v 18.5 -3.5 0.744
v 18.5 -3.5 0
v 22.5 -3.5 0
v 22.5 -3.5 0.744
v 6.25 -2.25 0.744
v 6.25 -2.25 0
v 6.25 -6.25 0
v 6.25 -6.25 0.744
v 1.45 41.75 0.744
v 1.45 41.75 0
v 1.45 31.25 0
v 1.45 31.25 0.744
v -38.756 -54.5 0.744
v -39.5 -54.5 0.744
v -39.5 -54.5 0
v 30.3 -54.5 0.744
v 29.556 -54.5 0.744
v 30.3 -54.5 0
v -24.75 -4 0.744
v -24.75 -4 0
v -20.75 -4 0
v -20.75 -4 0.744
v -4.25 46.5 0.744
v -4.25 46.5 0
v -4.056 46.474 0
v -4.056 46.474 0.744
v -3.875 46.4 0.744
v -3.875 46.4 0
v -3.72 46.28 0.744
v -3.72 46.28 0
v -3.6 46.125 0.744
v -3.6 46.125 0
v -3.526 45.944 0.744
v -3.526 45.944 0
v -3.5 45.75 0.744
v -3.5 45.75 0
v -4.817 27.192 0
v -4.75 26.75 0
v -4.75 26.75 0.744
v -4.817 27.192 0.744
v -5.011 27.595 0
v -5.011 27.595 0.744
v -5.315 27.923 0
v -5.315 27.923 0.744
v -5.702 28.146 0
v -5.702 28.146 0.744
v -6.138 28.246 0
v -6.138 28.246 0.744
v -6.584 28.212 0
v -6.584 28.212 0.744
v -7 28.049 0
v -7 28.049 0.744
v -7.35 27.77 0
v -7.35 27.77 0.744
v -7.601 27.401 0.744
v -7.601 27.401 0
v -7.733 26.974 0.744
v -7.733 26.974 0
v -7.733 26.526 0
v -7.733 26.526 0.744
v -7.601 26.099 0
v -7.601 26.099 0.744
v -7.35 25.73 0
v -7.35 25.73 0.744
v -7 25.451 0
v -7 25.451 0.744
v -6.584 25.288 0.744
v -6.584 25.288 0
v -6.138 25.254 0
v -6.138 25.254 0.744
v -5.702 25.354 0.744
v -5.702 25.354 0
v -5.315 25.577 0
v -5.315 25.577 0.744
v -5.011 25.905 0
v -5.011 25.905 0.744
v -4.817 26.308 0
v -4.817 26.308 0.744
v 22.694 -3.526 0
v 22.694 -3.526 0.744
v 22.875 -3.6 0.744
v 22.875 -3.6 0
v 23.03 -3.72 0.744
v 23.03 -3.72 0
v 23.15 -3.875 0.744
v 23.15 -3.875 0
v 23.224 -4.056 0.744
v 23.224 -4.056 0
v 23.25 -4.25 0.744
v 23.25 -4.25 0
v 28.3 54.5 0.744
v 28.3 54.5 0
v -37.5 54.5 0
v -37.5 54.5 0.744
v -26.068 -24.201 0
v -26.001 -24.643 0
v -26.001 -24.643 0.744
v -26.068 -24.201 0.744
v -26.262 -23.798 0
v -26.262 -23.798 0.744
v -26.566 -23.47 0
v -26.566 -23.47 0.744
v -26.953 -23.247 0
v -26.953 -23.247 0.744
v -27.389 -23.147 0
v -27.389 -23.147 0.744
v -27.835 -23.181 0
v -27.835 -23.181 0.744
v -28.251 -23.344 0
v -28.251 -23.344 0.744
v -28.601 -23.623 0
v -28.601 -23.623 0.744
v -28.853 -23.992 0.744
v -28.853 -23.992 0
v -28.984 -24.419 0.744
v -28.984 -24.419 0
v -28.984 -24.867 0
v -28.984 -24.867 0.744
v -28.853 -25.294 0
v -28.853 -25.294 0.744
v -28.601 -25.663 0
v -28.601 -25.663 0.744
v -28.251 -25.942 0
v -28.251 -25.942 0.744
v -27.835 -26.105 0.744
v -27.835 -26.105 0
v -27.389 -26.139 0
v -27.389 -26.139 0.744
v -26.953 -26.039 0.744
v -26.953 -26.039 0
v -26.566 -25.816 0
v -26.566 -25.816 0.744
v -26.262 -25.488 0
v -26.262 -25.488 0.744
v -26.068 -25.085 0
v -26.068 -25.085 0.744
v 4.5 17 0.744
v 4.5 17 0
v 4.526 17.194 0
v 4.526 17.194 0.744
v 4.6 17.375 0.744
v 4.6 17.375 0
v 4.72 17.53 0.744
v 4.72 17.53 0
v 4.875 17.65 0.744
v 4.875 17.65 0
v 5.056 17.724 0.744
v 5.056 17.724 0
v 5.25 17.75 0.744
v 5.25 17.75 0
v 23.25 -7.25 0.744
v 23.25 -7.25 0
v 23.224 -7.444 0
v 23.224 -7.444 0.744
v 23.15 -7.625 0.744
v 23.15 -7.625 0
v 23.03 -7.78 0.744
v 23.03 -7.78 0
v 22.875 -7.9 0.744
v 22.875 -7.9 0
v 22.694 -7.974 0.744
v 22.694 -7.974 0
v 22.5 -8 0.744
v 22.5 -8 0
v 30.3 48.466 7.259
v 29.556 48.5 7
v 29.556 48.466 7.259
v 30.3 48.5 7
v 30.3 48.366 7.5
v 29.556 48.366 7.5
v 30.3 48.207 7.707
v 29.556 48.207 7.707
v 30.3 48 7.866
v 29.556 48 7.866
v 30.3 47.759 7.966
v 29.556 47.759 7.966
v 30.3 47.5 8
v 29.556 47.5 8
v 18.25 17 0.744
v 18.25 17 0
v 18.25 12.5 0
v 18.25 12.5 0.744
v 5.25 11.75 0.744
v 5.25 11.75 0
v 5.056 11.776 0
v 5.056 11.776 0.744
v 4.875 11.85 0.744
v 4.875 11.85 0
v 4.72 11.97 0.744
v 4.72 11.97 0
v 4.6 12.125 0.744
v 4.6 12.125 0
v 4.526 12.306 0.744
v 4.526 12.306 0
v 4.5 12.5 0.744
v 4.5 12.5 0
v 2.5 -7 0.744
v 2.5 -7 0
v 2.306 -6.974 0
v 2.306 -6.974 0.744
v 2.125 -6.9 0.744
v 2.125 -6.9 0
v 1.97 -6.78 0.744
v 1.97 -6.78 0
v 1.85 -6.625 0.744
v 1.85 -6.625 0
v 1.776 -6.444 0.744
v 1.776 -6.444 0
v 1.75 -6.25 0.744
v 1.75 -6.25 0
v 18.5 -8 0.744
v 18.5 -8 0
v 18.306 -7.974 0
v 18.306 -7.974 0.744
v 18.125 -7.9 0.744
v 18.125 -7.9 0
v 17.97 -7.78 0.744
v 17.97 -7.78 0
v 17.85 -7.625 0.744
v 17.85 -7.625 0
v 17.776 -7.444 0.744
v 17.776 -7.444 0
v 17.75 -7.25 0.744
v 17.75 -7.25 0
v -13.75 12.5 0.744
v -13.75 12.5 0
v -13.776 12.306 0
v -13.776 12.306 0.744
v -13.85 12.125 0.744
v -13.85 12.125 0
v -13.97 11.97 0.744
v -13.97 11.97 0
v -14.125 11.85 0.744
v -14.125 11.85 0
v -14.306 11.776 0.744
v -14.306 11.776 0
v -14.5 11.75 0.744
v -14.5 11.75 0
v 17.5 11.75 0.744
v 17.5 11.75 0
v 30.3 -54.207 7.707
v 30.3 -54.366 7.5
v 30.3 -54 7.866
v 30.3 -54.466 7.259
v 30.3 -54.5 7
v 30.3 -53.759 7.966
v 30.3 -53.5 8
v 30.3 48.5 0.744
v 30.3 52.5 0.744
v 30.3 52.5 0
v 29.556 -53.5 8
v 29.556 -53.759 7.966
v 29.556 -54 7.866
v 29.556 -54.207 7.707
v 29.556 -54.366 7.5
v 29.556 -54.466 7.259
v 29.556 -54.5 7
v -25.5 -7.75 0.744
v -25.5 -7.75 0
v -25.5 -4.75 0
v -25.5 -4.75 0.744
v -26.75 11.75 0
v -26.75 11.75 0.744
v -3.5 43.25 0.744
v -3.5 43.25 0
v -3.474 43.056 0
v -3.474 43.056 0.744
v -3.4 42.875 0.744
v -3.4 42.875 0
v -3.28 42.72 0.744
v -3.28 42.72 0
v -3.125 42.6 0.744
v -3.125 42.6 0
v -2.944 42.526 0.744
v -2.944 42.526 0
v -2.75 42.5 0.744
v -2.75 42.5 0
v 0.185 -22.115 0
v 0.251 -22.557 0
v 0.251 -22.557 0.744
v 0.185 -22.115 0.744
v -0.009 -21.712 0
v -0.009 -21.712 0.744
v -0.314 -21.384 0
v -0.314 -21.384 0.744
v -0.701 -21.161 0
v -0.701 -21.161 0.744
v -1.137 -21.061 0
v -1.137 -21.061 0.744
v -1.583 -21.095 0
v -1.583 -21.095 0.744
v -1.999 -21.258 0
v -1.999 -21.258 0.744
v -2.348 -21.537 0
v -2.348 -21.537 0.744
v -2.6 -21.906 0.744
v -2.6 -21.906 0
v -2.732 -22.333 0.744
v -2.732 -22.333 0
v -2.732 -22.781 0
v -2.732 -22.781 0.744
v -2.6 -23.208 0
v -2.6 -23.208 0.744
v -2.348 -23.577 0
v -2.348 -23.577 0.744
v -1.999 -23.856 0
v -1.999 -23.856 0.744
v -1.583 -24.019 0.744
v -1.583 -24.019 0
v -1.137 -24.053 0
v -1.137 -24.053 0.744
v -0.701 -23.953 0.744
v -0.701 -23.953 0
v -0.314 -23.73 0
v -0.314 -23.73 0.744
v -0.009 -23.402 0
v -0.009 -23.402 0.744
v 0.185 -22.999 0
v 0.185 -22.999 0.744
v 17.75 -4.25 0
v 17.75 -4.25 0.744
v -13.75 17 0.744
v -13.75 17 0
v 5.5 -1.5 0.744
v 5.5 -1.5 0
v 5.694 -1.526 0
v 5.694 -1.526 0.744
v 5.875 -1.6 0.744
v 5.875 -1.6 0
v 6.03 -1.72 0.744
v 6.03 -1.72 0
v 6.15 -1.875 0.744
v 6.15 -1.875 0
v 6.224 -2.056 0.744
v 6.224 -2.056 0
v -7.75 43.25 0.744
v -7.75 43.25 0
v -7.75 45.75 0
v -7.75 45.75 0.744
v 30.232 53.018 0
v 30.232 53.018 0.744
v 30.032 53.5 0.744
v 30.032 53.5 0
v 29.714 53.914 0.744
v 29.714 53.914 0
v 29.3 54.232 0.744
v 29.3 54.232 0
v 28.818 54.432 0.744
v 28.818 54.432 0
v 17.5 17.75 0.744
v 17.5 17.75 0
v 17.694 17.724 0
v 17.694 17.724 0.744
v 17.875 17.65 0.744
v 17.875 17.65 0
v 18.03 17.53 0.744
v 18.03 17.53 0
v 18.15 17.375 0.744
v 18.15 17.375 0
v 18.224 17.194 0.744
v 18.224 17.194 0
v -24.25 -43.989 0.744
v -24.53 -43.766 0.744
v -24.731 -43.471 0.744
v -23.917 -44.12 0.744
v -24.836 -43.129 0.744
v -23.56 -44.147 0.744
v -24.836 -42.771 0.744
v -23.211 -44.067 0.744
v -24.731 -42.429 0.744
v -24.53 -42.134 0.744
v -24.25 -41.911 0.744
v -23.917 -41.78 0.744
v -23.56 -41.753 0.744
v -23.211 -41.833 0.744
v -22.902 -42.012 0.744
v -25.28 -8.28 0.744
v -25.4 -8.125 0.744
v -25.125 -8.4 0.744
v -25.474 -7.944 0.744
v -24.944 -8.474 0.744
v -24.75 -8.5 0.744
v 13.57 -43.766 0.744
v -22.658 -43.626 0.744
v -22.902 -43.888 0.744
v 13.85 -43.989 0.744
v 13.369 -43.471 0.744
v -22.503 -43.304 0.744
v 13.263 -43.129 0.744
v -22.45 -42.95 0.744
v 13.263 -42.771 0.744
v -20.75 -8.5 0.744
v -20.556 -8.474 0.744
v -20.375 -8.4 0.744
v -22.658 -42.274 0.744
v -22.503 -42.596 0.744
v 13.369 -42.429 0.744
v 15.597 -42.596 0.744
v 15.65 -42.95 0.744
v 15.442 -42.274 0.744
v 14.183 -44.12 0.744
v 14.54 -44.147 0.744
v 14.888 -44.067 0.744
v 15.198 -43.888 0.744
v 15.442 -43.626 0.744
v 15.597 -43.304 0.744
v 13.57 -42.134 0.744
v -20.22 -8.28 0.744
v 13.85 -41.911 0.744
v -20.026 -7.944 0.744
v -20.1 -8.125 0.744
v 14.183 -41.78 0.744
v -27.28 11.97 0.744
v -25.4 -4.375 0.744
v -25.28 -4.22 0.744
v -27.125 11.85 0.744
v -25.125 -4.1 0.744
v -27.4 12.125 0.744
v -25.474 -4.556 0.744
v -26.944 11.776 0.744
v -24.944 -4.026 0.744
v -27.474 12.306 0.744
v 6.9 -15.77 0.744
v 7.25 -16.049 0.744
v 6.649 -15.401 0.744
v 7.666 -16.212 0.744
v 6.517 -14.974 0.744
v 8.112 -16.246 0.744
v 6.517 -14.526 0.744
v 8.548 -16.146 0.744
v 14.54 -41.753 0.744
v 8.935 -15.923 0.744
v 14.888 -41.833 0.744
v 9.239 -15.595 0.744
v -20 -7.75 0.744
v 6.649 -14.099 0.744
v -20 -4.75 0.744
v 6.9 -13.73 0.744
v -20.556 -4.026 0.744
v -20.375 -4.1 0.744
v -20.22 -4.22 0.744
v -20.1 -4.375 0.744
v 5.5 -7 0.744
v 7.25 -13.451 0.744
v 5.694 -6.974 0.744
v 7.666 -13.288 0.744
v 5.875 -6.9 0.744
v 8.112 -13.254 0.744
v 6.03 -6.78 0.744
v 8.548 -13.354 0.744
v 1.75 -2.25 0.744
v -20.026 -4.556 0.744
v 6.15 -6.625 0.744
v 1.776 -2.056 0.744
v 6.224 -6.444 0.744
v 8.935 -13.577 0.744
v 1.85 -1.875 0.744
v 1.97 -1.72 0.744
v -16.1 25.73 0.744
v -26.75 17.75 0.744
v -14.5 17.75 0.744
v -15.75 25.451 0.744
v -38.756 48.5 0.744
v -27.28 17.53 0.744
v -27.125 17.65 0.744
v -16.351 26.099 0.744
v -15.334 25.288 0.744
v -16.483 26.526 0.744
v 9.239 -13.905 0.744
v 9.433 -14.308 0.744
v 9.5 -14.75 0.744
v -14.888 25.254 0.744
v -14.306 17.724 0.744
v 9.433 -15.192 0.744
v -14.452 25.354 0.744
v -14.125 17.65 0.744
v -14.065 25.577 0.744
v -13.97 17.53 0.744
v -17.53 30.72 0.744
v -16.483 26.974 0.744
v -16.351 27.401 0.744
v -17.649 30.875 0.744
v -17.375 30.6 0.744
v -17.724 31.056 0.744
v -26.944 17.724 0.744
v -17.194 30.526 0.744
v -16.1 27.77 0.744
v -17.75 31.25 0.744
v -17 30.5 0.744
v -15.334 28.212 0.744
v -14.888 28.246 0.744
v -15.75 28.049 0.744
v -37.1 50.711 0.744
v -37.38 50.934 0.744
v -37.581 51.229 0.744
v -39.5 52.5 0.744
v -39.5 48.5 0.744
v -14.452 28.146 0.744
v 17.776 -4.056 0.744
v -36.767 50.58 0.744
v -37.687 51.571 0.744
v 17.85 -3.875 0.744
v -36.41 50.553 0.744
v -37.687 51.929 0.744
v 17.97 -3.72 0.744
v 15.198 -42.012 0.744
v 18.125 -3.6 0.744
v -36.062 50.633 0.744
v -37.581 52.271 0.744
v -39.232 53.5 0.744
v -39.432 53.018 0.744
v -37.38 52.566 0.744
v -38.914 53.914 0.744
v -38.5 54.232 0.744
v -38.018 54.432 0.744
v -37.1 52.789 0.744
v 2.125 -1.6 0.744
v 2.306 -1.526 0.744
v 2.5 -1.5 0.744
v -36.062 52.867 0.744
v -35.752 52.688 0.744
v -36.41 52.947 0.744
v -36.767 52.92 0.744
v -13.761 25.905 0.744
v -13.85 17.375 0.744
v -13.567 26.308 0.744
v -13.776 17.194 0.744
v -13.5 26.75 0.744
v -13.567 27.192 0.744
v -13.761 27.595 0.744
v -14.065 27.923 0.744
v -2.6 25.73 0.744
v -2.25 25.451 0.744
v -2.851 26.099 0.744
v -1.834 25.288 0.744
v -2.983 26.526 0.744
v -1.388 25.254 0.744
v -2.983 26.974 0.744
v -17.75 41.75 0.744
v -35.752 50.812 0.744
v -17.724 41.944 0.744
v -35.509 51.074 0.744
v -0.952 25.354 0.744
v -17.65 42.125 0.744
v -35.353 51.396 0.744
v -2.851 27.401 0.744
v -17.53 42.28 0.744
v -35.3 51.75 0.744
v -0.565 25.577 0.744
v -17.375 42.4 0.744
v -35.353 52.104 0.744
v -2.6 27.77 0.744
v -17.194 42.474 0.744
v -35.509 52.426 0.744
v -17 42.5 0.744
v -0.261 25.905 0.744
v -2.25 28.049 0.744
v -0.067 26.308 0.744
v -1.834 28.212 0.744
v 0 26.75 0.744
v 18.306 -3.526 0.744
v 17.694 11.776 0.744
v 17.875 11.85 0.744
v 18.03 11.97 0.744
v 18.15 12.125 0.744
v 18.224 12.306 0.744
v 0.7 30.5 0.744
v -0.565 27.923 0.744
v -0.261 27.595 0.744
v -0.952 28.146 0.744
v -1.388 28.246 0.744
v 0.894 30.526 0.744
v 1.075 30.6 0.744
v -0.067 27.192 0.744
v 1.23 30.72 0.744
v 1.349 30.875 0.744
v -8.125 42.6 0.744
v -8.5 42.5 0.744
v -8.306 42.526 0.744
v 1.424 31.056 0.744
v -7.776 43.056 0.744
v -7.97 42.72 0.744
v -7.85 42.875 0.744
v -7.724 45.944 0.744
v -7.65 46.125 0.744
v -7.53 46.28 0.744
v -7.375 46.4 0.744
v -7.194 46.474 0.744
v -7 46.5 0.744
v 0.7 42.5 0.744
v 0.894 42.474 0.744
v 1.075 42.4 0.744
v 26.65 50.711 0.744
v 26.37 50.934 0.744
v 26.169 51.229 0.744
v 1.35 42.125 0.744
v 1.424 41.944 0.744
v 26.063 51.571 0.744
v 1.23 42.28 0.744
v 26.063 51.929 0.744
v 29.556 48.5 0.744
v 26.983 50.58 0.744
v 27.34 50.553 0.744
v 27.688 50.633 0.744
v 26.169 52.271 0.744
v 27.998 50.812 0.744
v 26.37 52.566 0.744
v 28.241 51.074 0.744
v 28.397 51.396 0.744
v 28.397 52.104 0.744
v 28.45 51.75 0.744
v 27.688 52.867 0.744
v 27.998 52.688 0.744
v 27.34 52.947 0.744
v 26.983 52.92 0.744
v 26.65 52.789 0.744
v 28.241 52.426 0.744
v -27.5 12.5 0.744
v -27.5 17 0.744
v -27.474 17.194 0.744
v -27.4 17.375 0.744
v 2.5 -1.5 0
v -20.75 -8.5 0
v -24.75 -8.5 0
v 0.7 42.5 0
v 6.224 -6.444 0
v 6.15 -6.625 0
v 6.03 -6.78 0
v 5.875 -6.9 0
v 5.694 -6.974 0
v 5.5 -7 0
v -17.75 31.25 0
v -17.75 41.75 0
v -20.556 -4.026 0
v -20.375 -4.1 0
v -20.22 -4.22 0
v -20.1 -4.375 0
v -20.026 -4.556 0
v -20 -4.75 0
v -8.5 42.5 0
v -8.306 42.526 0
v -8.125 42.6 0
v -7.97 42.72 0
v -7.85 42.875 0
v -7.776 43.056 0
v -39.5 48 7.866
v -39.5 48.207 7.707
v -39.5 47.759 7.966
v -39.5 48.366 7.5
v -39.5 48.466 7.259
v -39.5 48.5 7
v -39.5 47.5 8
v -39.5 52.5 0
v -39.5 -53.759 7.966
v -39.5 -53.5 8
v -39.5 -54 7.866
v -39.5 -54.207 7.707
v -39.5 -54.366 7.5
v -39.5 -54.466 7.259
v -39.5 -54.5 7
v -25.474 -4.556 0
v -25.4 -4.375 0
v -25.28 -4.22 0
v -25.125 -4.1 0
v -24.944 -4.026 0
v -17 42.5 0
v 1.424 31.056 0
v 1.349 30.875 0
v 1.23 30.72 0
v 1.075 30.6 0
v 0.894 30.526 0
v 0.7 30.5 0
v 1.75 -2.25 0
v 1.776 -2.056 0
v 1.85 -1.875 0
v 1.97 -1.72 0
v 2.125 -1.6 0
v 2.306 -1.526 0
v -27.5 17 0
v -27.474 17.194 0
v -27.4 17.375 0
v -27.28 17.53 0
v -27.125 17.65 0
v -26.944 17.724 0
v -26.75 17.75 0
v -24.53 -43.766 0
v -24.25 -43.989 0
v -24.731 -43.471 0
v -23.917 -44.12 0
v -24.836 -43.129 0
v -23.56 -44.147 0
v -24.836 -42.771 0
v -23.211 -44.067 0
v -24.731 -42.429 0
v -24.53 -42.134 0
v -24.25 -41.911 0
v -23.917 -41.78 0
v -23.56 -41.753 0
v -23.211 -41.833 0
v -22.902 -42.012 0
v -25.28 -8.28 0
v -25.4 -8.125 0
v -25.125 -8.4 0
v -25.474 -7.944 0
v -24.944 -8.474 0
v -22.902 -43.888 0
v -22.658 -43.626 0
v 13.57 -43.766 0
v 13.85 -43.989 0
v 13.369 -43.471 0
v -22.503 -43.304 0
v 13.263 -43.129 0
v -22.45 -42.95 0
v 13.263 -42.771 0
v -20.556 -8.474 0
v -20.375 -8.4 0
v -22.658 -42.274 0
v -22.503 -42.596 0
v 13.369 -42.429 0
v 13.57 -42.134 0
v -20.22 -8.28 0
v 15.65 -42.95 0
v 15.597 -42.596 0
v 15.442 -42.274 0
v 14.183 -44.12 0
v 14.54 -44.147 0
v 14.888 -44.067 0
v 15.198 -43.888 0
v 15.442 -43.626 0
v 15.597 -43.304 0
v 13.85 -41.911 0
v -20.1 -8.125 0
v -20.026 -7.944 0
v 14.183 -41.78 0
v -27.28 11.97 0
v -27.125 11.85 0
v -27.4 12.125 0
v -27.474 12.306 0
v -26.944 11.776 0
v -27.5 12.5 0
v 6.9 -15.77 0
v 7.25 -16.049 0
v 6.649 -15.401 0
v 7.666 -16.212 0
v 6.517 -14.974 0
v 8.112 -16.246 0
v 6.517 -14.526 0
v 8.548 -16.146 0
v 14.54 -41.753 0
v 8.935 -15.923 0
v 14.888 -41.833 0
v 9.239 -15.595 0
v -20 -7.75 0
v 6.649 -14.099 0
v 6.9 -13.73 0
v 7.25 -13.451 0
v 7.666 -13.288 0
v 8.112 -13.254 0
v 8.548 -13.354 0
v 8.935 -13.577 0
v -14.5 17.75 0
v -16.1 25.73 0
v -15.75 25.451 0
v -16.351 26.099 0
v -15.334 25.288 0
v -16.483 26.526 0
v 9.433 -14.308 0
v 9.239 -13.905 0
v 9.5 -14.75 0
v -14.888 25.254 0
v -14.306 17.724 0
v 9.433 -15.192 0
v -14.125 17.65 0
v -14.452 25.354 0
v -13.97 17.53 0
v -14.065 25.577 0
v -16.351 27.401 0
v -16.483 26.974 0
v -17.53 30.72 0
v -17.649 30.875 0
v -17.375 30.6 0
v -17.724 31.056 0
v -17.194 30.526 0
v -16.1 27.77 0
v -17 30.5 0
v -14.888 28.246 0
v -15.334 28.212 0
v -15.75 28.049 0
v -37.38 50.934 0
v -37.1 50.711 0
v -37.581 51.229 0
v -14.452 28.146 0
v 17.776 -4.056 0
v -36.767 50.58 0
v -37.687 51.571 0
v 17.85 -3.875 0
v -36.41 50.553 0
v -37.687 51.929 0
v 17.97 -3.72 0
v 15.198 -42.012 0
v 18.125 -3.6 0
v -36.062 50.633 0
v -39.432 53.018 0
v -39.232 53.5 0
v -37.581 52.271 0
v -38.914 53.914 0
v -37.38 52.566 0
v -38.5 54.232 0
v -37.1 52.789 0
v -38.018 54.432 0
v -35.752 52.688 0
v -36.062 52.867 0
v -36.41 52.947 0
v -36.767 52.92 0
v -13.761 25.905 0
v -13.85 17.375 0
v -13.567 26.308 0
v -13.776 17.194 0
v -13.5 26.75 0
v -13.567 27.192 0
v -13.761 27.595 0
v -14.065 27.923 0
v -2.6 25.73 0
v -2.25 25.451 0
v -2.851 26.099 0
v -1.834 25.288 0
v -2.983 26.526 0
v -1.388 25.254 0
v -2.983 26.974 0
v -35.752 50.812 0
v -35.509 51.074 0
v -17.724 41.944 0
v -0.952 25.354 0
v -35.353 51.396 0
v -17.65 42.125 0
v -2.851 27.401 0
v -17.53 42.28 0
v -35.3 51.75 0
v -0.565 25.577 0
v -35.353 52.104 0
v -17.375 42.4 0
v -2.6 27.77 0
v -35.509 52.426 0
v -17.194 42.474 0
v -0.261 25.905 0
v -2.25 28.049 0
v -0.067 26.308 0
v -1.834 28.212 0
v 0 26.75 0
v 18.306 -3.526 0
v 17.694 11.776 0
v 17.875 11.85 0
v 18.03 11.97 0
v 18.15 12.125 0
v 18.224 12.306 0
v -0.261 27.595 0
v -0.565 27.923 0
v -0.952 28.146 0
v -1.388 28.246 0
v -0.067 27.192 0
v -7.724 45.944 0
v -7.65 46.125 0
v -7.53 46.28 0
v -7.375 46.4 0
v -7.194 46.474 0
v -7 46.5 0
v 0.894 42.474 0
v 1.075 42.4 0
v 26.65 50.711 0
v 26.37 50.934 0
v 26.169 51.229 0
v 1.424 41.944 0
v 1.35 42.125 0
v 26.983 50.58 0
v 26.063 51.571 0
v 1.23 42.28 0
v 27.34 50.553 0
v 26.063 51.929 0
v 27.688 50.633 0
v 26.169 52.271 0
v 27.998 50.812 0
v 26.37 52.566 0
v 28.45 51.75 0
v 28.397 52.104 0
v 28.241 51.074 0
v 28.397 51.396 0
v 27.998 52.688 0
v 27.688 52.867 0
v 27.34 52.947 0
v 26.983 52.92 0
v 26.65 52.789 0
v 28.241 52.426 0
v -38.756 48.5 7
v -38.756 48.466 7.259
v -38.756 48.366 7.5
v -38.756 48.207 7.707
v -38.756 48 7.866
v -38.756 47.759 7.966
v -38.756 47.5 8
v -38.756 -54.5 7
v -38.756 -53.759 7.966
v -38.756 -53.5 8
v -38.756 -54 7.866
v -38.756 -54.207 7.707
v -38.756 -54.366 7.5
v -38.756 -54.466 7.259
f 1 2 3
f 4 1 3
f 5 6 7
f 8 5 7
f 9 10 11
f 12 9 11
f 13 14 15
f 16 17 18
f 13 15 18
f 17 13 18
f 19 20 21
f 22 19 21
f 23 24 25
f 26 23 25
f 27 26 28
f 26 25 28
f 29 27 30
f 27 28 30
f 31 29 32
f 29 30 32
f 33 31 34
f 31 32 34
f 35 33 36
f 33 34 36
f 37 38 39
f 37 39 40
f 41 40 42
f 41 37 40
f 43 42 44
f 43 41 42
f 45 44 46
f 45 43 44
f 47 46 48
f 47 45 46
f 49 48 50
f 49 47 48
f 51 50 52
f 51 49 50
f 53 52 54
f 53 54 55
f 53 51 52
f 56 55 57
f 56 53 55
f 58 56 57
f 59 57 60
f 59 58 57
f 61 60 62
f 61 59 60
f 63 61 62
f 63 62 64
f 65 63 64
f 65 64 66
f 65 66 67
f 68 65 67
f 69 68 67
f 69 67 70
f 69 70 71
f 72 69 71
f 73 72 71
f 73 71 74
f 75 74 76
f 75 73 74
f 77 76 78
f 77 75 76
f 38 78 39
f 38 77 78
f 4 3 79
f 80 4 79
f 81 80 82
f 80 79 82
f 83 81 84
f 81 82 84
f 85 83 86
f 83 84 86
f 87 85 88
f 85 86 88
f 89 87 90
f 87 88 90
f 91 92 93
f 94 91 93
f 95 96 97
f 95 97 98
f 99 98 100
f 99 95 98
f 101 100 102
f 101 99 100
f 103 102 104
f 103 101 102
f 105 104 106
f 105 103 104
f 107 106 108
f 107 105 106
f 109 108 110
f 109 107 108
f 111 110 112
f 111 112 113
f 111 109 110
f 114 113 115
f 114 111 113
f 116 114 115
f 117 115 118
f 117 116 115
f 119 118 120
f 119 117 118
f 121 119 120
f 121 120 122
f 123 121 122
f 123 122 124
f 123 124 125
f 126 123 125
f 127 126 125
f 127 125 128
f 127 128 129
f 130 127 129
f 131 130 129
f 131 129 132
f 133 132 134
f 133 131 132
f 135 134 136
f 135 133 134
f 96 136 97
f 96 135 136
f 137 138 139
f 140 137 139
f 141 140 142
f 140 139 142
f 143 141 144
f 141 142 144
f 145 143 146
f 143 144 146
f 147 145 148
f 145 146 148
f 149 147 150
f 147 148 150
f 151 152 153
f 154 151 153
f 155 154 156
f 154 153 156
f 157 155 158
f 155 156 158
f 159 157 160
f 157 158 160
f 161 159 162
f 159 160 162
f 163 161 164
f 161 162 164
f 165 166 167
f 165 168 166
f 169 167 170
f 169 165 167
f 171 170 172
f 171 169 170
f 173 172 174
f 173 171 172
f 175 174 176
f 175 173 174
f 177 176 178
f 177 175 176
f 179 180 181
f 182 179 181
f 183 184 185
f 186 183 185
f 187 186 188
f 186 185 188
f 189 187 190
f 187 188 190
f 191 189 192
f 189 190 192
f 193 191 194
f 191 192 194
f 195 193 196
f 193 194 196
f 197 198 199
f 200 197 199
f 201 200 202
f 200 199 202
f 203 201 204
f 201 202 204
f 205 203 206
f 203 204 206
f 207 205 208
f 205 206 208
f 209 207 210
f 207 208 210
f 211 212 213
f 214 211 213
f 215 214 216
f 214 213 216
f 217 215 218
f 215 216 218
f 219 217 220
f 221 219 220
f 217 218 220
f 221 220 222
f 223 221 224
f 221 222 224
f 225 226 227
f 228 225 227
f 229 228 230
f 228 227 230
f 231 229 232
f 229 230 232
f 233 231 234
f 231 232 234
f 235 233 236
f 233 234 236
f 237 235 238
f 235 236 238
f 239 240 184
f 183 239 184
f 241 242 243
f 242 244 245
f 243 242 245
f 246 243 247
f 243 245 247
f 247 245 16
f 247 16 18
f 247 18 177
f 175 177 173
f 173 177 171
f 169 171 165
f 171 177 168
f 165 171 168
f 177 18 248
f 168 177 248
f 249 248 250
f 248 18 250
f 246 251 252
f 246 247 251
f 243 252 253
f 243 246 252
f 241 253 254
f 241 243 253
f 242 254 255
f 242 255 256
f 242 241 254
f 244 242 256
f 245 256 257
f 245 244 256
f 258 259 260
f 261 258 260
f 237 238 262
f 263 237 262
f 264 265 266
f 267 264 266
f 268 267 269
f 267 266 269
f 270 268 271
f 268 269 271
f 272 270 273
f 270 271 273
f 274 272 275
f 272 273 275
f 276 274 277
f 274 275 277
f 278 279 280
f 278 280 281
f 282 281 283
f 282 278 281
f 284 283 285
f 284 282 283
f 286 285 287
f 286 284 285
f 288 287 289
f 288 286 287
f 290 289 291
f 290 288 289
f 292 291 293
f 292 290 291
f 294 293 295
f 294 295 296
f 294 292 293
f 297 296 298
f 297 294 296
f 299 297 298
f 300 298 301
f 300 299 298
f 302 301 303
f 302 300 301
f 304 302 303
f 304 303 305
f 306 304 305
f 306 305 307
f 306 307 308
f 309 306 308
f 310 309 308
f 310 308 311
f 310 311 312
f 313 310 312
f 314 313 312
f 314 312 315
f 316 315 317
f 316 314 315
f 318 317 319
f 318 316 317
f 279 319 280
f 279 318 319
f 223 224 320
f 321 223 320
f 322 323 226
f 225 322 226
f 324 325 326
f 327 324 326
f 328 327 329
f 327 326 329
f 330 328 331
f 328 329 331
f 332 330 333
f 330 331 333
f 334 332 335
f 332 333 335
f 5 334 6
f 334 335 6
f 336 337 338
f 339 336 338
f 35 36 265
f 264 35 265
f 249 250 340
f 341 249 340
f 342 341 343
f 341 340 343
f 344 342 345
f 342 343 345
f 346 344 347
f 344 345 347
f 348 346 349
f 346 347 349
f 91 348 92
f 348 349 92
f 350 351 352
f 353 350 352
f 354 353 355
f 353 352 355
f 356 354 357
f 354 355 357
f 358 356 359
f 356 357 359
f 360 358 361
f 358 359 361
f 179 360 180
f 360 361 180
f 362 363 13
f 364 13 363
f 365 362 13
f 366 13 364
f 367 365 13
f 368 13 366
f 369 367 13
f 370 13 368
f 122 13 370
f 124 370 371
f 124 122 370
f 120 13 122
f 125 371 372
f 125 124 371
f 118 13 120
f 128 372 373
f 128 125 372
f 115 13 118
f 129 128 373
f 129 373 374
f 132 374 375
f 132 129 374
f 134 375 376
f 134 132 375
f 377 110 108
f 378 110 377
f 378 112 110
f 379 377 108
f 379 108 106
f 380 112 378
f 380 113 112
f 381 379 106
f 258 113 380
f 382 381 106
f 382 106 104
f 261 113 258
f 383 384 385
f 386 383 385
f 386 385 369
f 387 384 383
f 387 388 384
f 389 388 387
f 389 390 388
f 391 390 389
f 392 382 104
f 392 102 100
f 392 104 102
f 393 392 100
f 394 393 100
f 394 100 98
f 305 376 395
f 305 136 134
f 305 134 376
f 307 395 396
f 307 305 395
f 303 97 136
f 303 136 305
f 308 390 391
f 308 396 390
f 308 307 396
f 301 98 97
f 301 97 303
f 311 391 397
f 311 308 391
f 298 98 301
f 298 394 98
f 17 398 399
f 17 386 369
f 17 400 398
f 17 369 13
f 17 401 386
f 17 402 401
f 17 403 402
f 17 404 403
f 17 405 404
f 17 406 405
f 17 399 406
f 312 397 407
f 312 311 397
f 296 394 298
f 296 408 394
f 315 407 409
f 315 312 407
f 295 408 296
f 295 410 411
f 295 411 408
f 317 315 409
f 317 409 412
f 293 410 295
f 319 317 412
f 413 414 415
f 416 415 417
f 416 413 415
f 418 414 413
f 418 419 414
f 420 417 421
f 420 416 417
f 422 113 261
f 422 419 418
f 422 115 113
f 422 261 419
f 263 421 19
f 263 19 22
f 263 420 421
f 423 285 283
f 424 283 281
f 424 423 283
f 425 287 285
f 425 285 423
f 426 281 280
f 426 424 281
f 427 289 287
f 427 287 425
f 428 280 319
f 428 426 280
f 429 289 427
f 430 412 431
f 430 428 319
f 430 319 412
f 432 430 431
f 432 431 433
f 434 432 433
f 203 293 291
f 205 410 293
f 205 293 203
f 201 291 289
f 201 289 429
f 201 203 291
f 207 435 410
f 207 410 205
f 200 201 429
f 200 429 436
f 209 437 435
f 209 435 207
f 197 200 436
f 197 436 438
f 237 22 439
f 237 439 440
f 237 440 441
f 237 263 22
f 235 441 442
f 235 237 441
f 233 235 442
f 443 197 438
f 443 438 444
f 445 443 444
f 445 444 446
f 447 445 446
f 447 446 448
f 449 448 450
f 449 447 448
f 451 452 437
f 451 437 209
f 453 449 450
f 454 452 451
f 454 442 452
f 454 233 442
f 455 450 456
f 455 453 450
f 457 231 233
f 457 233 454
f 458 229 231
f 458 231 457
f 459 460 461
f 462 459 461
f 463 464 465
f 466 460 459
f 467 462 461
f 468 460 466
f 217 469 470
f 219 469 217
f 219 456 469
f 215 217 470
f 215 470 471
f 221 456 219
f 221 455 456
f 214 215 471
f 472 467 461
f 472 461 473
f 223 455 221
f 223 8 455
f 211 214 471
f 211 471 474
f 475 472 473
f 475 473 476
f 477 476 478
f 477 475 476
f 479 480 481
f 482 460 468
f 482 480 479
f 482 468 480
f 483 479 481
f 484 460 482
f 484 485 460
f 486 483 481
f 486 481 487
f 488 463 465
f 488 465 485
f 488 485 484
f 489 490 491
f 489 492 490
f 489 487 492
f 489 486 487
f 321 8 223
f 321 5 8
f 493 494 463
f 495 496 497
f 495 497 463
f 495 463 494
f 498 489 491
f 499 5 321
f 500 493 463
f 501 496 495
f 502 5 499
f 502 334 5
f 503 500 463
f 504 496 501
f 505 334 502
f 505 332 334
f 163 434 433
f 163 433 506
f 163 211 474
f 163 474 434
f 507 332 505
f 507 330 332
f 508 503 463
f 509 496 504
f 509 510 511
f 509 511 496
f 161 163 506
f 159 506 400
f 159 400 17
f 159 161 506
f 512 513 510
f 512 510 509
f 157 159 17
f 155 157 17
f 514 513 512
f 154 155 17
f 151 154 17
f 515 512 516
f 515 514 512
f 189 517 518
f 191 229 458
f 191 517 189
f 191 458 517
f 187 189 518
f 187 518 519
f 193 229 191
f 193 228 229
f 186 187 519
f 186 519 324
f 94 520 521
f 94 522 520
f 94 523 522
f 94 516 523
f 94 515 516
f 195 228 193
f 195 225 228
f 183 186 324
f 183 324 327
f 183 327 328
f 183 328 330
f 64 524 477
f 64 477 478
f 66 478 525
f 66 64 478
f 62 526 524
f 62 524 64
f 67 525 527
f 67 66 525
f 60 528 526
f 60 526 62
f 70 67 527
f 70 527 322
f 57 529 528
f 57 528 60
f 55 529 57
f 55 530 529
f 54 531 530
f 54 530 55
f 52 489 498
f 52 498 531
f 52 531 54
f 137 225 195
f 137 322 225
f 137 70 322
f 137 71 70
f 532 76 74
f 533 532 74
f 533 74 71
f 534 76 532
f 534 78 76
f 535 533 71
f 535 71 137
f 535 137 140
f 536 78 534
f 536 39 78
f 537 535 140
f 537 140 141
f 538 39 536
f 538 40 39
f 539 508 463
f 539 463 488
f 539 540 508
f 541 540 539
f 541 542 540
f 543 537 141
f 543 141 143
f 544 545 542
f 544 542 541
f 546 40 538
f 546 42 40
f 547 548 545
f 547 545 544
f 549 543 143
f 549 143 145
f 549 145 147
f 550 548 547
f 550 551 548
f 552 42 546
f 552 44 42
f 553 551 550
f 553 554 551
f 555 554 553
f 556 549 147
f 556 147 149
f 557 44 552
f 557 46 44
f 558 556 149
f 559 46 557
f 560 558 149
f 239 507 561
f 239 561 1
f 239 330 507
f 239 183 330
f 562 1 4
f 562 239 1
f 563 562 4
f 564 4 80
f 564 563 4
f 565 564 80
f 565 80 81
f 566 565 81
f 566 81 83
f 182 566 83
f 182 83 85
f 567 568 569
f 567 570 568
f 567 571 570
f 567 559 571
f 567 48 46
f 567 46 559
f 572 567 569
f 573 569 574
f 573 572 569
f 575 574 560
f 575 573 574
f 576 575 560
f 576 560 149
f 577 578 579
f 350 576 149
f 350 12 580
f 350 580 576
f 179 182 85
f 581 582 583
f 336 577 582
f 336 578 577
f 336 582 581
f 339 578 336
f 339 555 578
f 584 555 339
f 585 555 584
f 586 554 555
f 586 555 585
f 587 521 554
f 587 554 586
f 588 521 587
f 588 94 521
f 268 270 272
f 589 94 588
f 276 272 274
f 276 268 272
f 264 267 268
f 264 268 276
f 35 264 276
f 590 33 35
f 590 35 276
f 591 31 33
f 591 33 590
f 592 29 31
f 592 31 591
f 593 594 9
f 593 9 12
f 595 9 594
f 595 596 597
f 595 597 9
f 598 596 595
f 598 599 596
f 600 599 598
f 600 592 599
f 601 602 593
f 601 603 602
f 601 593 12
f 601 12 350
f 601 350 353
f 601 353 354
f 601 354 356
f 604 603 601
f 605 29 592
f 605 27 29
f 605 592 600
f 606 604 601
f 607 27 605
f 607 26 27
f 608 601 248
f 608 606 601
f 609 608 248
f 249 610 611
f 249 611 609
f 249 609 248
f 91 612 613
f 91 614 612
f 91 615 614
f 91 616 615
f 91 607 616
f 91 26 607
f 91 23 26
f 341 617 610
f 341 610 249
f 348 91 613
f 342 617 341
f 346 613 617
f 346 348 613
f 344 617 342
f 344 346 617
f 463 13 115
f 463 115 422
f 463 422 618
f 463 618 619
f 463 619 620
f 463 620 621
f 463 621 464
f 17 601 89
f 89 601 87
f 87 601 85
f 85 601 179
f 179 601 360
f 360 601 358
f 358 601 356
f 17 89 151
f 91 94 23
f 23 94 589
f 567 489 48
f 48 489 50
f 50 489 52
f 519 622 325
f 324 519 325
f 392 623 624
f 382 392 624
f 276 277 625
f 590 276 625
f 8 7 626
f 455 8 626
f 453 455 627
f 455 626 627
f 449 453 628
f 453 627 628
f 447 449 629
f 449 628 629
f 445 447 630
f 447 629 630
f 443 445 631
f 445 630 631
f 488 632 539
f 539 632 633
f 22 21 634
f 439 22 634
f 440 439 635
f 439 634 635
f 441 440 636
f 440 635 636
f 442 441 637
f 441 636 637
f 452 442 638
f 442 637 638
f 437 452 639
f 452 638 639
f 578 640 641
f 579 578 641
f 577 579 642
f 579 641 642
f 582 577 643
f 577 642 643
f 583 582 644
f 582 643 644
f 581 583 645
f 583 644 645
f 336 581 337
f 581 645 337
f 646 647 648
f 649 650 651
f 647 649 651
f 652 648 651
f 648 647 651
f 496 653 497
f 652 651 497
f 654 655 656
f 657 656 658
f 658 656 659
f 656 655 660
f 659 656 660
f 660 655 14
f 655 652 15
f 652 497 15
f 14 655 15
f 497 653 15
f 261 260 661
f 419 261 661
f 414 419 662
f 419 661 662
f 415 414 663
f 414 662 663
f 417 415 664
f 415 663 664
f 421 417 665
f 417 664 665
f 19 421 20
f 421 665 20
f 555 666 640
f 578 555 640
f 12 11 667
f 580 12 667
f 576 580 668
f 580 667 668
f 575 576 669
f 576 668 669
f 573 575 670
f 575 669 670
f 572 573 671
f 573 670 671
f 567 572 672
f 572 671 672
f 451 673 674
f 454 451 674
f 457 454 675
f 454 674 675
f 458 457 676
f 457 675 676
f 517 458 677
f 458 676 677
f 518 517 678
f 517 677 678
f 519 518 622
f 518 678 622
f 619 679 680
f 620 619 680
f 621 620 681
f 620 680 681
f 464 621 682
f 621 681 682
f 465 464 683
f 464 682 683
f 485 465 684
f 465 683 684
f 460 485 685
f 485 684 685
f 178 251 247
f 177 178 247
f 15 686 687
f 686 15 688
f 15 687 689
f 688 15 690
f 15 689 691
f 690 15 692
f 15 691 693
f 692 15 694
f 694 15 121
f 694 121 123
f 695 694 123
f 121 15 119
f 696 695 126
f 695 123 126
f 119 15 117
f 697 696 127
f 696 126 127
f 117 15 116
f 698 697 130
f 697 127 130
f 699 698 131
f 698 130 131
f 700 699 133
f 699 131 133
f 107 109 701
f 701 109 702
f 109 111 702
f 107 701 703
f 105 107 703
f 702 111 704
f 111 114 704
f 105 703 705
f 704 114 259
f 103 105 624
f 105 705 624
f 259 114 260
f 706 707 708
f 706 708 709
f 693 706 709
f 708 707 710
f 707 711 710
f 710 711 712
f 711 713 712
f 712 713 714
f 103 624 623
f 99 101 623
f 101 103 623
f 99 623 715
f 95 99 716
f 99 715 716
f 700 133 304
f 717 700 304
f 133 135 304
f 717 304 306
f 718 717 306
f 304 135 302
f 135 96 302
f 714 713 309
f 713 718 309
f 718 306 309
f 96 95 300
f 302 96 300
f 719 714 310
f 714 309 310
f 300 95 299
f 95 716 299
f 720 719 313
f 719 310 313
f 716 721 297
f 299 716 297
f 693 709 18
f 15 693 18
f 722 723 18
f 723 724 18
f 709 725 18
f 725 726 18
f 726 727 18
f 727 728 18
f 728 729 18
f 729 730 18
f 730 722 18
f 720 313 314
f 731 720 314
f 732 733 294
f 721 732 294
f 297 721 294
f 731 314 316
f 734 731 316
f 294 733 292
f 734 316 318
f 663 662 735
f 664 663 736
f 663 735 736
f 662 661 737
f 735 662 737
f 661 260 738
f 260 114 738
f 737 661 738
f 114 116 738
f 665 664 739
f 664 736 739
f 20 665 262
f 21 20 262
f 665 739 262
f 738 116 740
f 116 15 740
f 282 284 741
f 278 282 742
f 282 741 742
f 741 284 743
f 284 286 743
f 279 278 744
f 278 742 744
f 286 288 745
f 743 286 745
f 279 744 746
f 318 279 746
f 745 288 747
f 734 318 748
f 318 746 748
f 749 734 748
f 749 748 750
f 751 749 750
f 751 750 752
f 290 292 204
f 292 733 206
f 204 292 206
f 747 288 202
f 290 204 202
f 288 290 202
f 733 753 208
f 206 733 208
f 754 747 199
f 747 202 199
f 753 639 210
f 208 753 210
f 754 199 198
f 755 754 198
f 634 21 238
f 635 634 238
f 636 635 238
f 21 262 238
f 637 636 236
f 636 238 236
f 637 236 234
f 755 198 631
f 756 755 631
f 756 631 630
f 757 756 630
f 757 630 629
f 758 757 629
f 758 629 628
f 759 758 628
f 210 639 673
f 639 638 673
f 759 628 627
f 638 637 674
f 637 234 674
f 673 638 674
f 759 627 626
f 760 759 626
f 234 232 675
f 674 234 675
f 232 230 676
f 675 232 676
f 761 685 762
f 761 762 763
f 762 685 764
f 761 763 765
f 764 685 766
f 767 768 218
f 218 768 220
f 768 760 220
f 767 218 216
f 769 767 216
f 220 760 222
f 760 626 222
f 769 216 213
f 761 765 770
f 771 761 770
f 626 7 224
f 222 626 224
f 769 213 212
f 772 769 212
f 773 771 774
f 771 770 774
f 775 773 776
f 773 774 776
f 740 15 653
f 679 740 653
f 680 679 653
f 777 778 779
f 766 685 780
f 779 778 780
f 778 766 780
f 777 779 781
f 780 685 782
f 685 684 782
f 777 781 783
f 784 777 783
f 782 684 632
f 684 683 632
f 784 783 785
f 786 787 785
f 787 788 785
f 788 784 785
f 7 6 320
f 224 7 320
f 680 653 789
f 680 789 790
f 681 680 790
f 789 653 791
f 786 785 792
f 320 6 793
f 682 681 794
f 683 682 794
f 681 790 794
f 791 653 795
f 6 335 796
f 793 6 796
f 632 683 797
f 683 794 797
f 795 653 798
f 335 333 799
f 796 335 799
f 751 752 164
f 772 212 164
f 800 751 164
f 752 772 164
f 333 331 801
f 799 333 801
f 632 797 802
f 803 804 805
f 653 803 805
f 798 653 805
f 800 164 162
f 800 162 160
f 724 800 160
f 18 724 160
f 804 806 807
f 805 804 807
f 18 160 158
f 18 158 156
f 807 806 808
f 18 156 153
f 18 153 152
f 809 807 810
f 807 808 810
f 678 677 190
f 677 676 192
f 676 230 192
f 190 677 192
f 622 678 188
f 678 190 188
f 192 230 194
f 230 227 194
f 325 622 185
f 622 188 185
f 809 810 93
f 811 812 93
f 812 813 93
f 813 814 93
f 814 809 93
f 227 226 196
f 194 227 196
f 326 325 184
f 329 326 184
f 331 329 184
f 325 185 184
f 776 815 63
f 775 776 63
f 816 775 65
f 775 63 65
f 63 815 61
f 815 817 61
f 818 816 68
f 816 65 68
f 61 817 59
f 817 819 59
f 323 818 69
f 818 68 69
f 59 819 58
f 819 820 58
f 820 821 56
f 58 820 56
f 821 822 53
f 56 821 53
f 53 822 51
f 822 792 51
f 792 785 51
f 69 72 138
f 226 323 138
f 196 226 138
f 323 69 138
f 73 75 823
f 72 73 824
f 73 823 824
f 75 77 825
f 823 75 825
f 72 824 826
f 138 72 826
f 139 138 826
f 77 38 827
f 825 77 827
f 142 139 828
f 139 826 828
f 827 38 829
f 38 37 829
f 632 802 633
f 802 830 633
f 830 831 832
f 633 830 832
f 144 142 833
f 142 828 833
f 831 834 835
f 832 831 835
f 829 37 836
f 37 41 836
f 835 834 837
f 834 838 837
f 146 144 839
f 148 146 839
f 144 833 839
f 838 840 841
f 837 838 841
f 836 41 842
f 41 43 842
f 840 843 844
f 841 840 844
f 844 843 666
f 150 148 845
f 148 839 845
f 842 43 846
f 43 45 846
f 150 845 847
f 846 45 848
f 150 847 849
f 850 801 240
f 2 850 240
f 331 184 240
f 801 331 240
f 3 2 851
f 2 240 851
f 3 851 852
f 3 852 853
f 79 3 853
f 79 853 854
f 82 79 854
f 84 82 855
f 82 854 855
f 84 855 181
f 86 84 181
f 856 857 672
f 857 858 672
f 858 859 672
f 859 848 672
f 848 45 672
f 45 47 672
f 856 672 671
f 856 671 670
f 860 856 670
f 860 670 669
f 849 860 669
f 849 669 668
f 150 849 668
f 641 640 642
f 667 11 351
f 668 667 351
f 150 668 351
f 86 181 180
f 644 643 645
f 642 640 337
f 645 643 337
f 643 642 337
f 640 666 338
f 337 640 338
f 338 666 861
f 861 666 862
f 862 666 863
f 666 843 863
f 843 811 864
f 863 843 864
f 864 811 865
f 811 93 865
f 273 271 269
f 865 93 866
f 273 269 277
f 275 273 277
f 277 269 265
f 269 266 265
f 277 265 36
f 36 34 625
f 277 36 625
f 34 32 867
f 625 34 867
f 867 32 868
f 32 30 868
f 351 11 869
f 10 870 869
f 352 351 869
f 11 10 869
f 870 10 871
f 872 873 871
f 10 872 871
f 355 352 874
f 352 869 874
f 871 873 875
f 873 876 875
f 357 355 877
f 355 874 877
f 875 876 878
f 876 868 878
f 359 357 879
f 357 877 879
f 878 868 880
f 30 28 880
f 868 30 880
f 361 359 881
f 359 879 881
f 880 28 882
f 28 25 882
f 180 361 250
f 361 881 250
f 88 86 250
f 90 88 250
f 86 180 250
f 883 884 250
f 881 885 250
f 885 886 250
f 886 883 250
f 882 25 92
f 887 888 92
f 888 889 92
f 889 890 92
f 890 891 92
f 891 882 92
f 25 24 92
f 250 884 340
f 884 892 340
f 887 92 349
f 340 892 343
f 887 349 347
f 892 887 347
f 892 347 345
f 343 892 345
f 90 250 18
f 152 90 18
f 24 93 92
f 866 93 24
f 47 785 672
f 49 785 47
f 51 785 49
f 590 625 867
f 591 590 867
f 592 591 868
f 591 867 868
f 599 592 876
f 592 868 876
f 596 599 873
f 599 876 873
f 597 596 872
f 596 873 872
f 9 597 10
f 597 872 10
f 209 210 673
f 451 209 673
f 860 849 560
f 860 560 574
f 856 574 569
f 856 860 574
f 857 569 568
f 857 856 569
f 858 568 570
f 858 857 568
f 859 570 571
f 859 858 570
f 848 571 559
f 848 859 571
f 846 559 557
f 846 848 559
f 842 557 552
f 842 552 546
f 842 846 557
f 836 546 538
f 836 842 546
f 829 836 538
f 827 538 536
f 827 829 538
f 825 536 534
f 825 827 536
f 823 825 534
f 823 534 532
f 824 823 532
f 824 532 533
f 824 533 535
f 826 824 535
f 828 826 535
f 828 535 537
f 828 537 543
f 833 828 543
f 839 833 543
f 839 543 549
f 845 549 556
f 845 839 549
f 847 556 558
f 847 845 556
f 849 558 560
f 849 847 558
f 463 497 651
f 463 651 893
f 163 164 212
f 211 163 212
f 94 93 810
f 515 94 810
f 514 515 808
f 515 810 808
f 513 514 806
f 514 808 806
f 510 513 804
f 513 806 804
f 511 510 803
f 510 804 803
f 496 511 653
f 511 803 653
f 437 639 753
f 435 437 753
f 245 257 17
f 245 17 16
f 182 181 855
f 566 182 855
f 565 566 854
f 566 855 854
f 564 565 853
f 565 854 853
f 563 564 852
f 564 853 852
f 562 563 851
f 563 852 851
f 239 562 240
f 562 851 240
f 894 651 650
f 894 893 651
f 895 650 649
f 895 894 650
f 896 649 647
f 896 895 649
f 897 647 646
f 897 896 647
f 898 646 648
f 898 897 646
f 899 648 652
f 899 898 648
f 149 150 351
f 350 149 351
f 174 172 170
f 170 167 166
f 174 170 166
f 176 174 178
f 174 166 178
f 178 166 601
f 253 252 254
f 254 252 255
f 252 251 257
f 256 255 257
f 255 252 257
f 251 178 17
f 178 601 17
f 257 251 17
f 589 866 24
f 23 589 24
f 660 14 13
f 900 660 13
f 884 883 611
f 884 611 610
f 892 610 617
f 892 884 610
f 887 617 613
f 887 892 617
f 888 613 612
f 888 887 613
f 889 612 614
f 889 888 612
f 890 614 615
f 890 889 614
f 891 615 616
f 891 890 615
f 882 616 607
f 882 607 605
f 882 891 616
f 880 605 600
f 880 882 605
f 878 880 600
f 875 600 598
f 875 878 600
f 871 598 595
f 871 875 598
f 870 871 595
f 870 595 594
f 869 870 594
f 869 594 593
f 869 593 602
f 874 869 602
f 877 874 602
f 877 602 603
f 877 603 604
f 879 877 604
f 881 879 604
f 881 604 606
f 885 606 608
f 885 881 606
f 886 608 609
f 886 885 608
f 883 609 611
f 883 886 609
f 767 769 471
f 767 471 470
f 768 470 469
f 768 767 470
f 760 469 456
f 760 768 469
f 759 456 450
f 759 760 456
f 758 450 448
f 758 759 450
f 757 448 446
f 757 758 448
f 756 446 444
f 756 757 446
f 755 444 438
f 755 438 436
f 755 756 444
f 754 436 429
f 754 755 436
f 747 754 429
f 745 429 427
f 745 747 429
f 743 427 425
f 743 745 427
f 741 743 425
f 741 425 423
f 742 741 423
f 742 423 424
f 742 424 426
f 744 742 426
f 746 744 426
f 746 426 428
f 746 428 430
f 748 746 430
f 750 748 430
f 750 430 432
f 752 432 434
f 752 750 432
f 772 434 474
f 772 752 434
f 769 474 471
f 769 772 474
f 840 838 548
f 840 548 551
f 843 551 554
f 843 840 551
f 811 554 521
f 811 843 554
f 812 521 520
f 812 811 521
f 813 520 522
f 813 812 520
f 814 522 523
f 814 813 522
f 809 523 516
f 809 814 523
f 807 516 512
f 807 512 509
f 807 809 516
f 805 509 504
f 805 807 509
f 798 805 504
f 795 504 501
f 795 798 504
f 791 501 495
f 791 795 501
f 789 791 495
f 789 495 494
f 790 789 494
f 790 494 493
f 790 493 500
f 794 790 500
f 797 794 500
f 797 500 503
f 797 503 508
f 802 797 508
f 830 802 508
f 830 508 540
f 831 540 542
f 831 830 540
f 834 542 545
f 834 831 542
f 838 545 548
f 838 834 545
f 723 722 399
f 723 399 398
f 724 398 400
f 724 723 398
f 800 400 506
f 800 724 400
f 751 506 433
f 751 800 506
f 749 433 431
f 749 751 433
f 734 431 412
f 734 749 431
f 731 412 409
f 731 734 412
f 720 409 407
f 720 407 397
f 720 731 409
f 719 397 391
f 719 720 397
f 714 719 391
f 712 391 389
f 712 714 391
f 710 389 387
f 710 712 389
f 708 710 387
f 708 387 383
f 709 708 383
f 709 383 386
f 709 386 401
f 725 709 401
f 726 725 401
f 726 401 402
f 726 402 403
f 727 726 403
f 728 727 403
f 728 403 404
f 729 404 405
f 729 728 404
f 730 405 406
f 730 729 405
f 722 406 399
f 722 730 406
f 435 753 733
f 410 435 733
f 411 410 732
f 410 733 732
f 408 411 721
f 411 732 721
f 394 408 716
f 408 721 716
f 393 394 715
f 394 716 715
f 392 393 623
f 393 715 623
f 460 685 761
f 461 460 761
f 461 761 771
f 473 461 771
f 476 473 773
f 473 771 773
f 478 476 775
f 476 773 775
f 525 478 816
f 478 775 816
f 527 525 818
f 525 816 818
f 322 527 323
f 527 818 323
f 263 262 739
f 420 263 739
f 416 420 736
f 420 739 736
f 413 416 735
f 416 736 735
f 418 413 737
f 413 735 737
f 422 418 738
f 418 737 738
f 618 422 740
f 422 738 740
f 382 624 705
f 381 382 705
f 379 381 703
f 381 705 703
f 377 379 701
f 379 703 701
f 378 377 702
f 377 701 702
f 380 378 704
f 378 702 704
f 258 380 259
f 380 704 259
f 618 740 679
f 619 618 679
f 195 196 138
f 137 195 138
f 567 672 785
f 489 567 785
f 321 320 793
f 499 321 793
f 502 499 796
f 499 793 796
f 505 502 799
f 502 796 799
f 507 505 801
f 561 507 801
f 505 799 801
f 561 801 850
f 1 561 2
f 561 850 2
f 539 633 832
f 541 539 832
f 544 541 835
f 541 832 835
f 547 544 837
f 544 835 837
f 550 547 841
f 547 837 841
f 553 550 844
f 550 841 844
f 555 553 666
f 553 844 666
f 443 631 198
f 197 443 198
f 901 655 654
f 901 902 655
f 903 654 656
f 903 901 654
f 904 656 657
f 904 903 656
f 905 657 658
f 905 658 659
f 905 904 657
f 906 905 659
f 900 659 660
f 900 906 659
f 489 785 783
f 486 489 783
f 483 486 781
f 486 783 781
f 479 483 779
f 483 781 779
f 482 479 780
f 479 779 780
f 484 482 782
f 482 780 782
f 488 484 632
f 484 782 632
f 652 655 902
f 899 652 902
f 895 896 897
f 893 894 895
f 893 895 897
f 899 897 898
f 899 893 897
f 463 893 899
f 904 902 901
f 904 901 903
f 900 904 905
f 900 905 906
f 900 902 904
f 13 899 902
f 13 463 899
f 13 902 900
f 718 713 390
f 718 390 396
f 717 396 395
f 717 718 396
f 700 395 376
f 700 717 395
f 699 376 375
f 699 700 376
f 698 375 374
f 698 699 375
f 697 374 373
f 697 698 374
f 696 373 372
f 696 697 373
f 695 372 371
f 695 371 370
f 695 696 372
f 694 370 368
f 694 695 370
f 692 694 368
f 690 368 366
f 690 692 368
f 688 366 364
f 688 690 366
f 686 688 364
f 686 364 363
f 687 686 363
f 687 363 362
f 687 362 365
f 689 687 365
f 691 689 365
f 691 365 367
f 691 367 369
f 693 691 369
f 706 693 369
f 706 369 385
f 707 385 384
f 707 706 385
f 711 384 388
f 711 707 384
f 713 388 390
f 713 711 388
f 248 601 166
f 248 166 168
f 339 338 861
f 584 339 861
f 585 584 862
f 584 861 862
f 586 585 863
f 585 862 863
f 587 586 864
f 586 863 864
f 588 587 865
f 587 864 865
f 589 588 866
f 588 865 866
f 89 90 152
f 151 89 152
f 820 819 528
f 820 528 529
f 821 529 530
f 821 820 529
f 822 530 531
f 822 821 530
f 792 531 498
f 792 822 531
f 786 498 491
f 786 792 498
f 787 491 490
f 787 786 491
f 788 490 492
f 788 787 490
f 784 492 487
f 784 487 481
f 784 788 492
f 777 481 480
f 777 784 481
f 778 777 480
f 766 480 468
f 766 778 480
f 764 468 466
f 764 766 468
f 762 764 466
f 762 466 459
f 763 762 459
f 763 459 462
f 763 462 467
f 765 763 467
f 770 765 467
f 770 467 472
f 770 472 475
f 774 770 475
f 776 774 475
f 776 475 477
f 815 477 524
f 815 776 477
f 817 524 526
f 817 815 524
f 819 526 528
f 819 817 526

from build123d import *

# Parameters (mm, degrees)
F0_R     = 1.2
F0_R_2   = 1.5
F1_DEPTH = 0.744
F2_W     = 0.744
F2_H     = 103
F2_H_2   = 102.999995
F3_DEPTH = 8
F4_R     = 1


# Not quite as in the source:
# - ends of sketch curves that miss each other by under 0.0002 mm in the source are joined


with BuildPart() as f1:
    # F0 (on Top) → F1 (new body)
    with BuildSketch(Plane.XY):
        with BuildLine():
            Line((-39.500012, -54.499996), (30.29995, -54.500001))
            Line((30.29995, -54.500001), (30.29995, 52.4999855731))
            ThreePointArc((30.29995, 52.4999855731), (29.714163765, 53.9141989328), (28.2999505731, 54.4999855731))
            Line((28.2999505731, 54.4999855731), (-37.5000114269, 54.5000044269))
            ThreePointArc((-37.5000114269, 54.5000044269), (-38.9142253598, 53.9142181919), (-39.500012, 52.5000044269))
            Line((-39.500012, 52.5000044269), (-39.500012, -54.499996))
        make_face()
        with Locations((-23.649861, -42.950105)):
            Circle(F0_R, mode=Mode.SUBTRACT)
        with Locations((-27.501189, -24.642994)):
            Circle(F0_R_2, mode=Mode.SUBTRACT)
        with BuildLine():
            Line((-20.749991, -8.499996), (-24.749991, -8.499996))
            ThreePointArc((-24.749991, -8.499996), (-25.2803207323, -8.2803268537), (-25.499992, -7.749998))
            Line((-25.499992, -7.749998), (-25.499992, -4.749996))
            ThreePointArc((-25.499992, -4.749996), (-25.2803225001, -4.2196659141), (-24.749993, -3.999995))
            Line((-24.749993, -3.999995), (-20.749991, -3.999995))
            ThreePointArc((-20.749991, -3.999995), (-20.2196642677, -4.2196641463), (-19.999993, -4.749993))
            Line((-19.999993, -4.749993), (-19.999993, -7.749995))
            ThreePointArc((-19.999993, -7.749995), (-20.2196621463, -8.2803247323), (-20.749991, -8.499996))
        make_face(mode=Mode.SUBTRACT)
        with Locations((14.450063, -42.950105)):
            Circle(F0_R, mode=Mode.SUBTRACT)
        with Locations((-1.248788, -22.556994)):
            Circle(F0_R_2, mode=Mode.SUBTRACT)
        with Locations((8.00001, -14.749994)):
            Circle(F0_R_2, mode=Mode.SUBTRACT)
        with BuildLine():
            ThreePointArc((2.500013, -6.999991), (1.9696832677, -6.7803218537), (1.750012, -6.249993))
            Line((1.750012, -6.249993), (1.750012, -2.249993))
            ThreePointArc((1.750012, -2.249993), (1.9696814999, -1.7196629141), (2.500011, -1.499992))
            Line((2.500011, -1.499992), (5.500012, -1.499992))
            ThreePointArc((5.500012, -1.499992), (6.0303420859, -1.7196614999), (6.250013, -2.249991))
            Line((6.250013, -2.249991), (6.250013, -6.249993))
            ThreePointArc((6.250013, -6.249993), (6.0303438537, -6.7803197323), (5.500015, -6.999991))
            Line((5.500015, -6.999991), (2.500013, -6.999991))
        make_face(mode=Mode.SUBTRACT)
        with BuildLine():
            ThreePointArc((17.750011, -4.249994), (17.9696801463, -3.7196642677), (18.500009, -3.499993))
            Line((18.500009, -3.499993), (22.500011, -3.499993))
            ThreePointArc((22.500011, -3.499993), (23.0303390859, -3.7196624999), (23.25001, -4.249992))
            Line((23.25001, -4.249992), (23.25001, -7.249993))
            ThreePointArc((23.25001, -7.249993), (23.0303405001, -7.7803230859), (22.500011, -7.999994))
            Line((22.500011, -7.999994), (18.500012, -7.999995))
            ThreePointArc((18.500012, -7.999995), (17.9696822677, -7.7803248537), (17.750011, -7.249996))
            Line((17.750011, -7.249996), (17.750011, -4.249994))
        make_face(mode=Mode.SUBTRACT)
        with BuildLine():
            Line((-13.749987, 17.000004), (-13.749987, 12.500005))
            ThreePointArc((-13.749987, 12.500005), (-13.9696564999, 11.9696749141), (-14.499986, 11.750004))
            Line((-14.499986, 11.750004), (-26.749989, 11.750004))
            ThreePointArc((-26.749989, 11.750004), (-27.2803170859, 11.9696734999), (-27.499988, 12.500003))
            Line((-27.499988, 12.500003), (-27.499988, 17.000004))
            ThreePointArc((-27.499988, 17.000004), (-27.2803185001, 17.5303340859), (-26.749989, 17.750005))
            Line((-26.749989, 17.750005), (-14.499988, 17.750005))
            ThreePointArc((-14.499988, 17.750005), (-13.9696579141, 17.5303355001), (-13.749987, 17.000004))
        make_face(mode=Mode.SUBTRACT)
        with Locations((-14.999987, 26.750007)):
            Circle(F0_R_2, mode=Mode.SUBTRACT)
        with Locations((-6.249987, 26.750005)):
            Circle(F0_R_2, mode=Mode.SUBTRACT)
        with Locations((-36.499988, 51.750005)):
            Circle(F0_R, mode=Mode.SUBTRACT)
        with BuildLine():
            ThreePointArc((-16.999976, 30.499992), (-17.5303057323, 30.7196611463), (-17.749977, 31.24999))
            Line((-17.749977, 31.24999), (-17.749987, 41.749995))
            ThreePointArc((-17.749987, 41.749995), (-17.5303305001, 42.2803250859), (-17.000001, 42.499996))
            Line((-17.000001, 42.499996), (-8.499988, 42.500006))
            ThreePointArc((-8.499988, 42.500006), (-7.9696584999, 42.7196769141), (-7.749989, 43.250007))
            Line((-7.749989, 43.250007), (-7.749989, 45.750005))
            ThreePointArc((-7.749989, 45.750005), (-7.5303175001, 46.2803350859), (-6.999988, 46.500006))
            Line((-6.999988, 46.500006), (-4.249989, 46.500006))
            ThreePointArc((-4.249989, 46.500006), (-3.7196594999, 46.2803350859), (-3.49999, 45.750005))
            Line((-3.49999, 45.750005), (-3.499987, 43.250007))
            ThreePointArc((-3.499987, 43.250007), (-3.2803178537, 42.7196772677), (-2.749989, 42.500006))
            Line((-2.749989, 42.500006), (0.699984, 42.500006))
            ThreePointArc((0.699984, 42.500006), (1.2303137323, 42.2803368537), (1.449985, 41.750008))
            Line((1.449985, 41.750008), (1.449985, 41.250006))
            Line((1.449985, 41.250006), (1.449985, 31.24999))
            ThreePointArc((1.449985, 31.24999), (1.2303037323, 30.7196611463), (0.699974, 30.499992))
            Line((0.699974, 30.499992), (-16.999976, 30.499992))
        make_face(mode=Mode.SUBTRACT)
        with Locations((-1.499989, 26.750005)):
            Circle(F0_R_2, mode=Mode.SUBTRACT)
        with BuildLine():
            ThreePointArc((5.250013, 11.750004), (4.7196829141, 11.9696734999), (4.500012, 12.500003))
            Line((4.500012, 12.500003), (4.500012, 17.000004))
            ThreePointArc((4.500012, 17.000004), (4.7196811463, 17.5303337323), (5.25001, 17.750005))
            Line((5.25001, 17.750005), (17.500011, 17.750005))
            ThreePointArc((17.500011, 17.750005), (18.0303410859, 17.5303355001), (18.250012, 17.000006))
            Line((18.250012, 17.000006), (18.250012, 12.500005))
            ThreePointArc((18.250012, 12.500005), (18.0303428537, 11.9696752677), (17.500014, 11.750004))
            Line((17.500014, 11.750004), (5.250013, 11.750004))
        make_face(mode=Mode.SUBTRACT)
        with Locations((27.250012, 51.750005)):
            Circle(F0_R, mode=Mode.SUBTRACT)
    extrude(amount=F1_DEPTH)

    # F2 (on face) → F3 (join)
    with BuildSketch(Plane(origin=(0, 0, 0), x_dir=(1, 0, 0), z_dir=(0, 0, -1))):
        with Locations((29.92795, 3.000001)):
            Rectangle(F2_W, F2_H)
        with Locations((-39.128012, 2.9999985)):
            Rectangle(F2_W, F2_H_2)
    extrude(amount=-F3_DEPTH)

    # F4
    f4_edges = [f1.edges().sort_by_distance(p)[0] for p in [
        (29.92795, -54.500001, 8),
        (29.92795, 48.499999, 8),
        (-39.128012, 48.499999, 8),
        (-39.128012, -54.499996, 8),
    ]]
    fillet(f4_edges, radius=F4_R)


solid = f1.part
